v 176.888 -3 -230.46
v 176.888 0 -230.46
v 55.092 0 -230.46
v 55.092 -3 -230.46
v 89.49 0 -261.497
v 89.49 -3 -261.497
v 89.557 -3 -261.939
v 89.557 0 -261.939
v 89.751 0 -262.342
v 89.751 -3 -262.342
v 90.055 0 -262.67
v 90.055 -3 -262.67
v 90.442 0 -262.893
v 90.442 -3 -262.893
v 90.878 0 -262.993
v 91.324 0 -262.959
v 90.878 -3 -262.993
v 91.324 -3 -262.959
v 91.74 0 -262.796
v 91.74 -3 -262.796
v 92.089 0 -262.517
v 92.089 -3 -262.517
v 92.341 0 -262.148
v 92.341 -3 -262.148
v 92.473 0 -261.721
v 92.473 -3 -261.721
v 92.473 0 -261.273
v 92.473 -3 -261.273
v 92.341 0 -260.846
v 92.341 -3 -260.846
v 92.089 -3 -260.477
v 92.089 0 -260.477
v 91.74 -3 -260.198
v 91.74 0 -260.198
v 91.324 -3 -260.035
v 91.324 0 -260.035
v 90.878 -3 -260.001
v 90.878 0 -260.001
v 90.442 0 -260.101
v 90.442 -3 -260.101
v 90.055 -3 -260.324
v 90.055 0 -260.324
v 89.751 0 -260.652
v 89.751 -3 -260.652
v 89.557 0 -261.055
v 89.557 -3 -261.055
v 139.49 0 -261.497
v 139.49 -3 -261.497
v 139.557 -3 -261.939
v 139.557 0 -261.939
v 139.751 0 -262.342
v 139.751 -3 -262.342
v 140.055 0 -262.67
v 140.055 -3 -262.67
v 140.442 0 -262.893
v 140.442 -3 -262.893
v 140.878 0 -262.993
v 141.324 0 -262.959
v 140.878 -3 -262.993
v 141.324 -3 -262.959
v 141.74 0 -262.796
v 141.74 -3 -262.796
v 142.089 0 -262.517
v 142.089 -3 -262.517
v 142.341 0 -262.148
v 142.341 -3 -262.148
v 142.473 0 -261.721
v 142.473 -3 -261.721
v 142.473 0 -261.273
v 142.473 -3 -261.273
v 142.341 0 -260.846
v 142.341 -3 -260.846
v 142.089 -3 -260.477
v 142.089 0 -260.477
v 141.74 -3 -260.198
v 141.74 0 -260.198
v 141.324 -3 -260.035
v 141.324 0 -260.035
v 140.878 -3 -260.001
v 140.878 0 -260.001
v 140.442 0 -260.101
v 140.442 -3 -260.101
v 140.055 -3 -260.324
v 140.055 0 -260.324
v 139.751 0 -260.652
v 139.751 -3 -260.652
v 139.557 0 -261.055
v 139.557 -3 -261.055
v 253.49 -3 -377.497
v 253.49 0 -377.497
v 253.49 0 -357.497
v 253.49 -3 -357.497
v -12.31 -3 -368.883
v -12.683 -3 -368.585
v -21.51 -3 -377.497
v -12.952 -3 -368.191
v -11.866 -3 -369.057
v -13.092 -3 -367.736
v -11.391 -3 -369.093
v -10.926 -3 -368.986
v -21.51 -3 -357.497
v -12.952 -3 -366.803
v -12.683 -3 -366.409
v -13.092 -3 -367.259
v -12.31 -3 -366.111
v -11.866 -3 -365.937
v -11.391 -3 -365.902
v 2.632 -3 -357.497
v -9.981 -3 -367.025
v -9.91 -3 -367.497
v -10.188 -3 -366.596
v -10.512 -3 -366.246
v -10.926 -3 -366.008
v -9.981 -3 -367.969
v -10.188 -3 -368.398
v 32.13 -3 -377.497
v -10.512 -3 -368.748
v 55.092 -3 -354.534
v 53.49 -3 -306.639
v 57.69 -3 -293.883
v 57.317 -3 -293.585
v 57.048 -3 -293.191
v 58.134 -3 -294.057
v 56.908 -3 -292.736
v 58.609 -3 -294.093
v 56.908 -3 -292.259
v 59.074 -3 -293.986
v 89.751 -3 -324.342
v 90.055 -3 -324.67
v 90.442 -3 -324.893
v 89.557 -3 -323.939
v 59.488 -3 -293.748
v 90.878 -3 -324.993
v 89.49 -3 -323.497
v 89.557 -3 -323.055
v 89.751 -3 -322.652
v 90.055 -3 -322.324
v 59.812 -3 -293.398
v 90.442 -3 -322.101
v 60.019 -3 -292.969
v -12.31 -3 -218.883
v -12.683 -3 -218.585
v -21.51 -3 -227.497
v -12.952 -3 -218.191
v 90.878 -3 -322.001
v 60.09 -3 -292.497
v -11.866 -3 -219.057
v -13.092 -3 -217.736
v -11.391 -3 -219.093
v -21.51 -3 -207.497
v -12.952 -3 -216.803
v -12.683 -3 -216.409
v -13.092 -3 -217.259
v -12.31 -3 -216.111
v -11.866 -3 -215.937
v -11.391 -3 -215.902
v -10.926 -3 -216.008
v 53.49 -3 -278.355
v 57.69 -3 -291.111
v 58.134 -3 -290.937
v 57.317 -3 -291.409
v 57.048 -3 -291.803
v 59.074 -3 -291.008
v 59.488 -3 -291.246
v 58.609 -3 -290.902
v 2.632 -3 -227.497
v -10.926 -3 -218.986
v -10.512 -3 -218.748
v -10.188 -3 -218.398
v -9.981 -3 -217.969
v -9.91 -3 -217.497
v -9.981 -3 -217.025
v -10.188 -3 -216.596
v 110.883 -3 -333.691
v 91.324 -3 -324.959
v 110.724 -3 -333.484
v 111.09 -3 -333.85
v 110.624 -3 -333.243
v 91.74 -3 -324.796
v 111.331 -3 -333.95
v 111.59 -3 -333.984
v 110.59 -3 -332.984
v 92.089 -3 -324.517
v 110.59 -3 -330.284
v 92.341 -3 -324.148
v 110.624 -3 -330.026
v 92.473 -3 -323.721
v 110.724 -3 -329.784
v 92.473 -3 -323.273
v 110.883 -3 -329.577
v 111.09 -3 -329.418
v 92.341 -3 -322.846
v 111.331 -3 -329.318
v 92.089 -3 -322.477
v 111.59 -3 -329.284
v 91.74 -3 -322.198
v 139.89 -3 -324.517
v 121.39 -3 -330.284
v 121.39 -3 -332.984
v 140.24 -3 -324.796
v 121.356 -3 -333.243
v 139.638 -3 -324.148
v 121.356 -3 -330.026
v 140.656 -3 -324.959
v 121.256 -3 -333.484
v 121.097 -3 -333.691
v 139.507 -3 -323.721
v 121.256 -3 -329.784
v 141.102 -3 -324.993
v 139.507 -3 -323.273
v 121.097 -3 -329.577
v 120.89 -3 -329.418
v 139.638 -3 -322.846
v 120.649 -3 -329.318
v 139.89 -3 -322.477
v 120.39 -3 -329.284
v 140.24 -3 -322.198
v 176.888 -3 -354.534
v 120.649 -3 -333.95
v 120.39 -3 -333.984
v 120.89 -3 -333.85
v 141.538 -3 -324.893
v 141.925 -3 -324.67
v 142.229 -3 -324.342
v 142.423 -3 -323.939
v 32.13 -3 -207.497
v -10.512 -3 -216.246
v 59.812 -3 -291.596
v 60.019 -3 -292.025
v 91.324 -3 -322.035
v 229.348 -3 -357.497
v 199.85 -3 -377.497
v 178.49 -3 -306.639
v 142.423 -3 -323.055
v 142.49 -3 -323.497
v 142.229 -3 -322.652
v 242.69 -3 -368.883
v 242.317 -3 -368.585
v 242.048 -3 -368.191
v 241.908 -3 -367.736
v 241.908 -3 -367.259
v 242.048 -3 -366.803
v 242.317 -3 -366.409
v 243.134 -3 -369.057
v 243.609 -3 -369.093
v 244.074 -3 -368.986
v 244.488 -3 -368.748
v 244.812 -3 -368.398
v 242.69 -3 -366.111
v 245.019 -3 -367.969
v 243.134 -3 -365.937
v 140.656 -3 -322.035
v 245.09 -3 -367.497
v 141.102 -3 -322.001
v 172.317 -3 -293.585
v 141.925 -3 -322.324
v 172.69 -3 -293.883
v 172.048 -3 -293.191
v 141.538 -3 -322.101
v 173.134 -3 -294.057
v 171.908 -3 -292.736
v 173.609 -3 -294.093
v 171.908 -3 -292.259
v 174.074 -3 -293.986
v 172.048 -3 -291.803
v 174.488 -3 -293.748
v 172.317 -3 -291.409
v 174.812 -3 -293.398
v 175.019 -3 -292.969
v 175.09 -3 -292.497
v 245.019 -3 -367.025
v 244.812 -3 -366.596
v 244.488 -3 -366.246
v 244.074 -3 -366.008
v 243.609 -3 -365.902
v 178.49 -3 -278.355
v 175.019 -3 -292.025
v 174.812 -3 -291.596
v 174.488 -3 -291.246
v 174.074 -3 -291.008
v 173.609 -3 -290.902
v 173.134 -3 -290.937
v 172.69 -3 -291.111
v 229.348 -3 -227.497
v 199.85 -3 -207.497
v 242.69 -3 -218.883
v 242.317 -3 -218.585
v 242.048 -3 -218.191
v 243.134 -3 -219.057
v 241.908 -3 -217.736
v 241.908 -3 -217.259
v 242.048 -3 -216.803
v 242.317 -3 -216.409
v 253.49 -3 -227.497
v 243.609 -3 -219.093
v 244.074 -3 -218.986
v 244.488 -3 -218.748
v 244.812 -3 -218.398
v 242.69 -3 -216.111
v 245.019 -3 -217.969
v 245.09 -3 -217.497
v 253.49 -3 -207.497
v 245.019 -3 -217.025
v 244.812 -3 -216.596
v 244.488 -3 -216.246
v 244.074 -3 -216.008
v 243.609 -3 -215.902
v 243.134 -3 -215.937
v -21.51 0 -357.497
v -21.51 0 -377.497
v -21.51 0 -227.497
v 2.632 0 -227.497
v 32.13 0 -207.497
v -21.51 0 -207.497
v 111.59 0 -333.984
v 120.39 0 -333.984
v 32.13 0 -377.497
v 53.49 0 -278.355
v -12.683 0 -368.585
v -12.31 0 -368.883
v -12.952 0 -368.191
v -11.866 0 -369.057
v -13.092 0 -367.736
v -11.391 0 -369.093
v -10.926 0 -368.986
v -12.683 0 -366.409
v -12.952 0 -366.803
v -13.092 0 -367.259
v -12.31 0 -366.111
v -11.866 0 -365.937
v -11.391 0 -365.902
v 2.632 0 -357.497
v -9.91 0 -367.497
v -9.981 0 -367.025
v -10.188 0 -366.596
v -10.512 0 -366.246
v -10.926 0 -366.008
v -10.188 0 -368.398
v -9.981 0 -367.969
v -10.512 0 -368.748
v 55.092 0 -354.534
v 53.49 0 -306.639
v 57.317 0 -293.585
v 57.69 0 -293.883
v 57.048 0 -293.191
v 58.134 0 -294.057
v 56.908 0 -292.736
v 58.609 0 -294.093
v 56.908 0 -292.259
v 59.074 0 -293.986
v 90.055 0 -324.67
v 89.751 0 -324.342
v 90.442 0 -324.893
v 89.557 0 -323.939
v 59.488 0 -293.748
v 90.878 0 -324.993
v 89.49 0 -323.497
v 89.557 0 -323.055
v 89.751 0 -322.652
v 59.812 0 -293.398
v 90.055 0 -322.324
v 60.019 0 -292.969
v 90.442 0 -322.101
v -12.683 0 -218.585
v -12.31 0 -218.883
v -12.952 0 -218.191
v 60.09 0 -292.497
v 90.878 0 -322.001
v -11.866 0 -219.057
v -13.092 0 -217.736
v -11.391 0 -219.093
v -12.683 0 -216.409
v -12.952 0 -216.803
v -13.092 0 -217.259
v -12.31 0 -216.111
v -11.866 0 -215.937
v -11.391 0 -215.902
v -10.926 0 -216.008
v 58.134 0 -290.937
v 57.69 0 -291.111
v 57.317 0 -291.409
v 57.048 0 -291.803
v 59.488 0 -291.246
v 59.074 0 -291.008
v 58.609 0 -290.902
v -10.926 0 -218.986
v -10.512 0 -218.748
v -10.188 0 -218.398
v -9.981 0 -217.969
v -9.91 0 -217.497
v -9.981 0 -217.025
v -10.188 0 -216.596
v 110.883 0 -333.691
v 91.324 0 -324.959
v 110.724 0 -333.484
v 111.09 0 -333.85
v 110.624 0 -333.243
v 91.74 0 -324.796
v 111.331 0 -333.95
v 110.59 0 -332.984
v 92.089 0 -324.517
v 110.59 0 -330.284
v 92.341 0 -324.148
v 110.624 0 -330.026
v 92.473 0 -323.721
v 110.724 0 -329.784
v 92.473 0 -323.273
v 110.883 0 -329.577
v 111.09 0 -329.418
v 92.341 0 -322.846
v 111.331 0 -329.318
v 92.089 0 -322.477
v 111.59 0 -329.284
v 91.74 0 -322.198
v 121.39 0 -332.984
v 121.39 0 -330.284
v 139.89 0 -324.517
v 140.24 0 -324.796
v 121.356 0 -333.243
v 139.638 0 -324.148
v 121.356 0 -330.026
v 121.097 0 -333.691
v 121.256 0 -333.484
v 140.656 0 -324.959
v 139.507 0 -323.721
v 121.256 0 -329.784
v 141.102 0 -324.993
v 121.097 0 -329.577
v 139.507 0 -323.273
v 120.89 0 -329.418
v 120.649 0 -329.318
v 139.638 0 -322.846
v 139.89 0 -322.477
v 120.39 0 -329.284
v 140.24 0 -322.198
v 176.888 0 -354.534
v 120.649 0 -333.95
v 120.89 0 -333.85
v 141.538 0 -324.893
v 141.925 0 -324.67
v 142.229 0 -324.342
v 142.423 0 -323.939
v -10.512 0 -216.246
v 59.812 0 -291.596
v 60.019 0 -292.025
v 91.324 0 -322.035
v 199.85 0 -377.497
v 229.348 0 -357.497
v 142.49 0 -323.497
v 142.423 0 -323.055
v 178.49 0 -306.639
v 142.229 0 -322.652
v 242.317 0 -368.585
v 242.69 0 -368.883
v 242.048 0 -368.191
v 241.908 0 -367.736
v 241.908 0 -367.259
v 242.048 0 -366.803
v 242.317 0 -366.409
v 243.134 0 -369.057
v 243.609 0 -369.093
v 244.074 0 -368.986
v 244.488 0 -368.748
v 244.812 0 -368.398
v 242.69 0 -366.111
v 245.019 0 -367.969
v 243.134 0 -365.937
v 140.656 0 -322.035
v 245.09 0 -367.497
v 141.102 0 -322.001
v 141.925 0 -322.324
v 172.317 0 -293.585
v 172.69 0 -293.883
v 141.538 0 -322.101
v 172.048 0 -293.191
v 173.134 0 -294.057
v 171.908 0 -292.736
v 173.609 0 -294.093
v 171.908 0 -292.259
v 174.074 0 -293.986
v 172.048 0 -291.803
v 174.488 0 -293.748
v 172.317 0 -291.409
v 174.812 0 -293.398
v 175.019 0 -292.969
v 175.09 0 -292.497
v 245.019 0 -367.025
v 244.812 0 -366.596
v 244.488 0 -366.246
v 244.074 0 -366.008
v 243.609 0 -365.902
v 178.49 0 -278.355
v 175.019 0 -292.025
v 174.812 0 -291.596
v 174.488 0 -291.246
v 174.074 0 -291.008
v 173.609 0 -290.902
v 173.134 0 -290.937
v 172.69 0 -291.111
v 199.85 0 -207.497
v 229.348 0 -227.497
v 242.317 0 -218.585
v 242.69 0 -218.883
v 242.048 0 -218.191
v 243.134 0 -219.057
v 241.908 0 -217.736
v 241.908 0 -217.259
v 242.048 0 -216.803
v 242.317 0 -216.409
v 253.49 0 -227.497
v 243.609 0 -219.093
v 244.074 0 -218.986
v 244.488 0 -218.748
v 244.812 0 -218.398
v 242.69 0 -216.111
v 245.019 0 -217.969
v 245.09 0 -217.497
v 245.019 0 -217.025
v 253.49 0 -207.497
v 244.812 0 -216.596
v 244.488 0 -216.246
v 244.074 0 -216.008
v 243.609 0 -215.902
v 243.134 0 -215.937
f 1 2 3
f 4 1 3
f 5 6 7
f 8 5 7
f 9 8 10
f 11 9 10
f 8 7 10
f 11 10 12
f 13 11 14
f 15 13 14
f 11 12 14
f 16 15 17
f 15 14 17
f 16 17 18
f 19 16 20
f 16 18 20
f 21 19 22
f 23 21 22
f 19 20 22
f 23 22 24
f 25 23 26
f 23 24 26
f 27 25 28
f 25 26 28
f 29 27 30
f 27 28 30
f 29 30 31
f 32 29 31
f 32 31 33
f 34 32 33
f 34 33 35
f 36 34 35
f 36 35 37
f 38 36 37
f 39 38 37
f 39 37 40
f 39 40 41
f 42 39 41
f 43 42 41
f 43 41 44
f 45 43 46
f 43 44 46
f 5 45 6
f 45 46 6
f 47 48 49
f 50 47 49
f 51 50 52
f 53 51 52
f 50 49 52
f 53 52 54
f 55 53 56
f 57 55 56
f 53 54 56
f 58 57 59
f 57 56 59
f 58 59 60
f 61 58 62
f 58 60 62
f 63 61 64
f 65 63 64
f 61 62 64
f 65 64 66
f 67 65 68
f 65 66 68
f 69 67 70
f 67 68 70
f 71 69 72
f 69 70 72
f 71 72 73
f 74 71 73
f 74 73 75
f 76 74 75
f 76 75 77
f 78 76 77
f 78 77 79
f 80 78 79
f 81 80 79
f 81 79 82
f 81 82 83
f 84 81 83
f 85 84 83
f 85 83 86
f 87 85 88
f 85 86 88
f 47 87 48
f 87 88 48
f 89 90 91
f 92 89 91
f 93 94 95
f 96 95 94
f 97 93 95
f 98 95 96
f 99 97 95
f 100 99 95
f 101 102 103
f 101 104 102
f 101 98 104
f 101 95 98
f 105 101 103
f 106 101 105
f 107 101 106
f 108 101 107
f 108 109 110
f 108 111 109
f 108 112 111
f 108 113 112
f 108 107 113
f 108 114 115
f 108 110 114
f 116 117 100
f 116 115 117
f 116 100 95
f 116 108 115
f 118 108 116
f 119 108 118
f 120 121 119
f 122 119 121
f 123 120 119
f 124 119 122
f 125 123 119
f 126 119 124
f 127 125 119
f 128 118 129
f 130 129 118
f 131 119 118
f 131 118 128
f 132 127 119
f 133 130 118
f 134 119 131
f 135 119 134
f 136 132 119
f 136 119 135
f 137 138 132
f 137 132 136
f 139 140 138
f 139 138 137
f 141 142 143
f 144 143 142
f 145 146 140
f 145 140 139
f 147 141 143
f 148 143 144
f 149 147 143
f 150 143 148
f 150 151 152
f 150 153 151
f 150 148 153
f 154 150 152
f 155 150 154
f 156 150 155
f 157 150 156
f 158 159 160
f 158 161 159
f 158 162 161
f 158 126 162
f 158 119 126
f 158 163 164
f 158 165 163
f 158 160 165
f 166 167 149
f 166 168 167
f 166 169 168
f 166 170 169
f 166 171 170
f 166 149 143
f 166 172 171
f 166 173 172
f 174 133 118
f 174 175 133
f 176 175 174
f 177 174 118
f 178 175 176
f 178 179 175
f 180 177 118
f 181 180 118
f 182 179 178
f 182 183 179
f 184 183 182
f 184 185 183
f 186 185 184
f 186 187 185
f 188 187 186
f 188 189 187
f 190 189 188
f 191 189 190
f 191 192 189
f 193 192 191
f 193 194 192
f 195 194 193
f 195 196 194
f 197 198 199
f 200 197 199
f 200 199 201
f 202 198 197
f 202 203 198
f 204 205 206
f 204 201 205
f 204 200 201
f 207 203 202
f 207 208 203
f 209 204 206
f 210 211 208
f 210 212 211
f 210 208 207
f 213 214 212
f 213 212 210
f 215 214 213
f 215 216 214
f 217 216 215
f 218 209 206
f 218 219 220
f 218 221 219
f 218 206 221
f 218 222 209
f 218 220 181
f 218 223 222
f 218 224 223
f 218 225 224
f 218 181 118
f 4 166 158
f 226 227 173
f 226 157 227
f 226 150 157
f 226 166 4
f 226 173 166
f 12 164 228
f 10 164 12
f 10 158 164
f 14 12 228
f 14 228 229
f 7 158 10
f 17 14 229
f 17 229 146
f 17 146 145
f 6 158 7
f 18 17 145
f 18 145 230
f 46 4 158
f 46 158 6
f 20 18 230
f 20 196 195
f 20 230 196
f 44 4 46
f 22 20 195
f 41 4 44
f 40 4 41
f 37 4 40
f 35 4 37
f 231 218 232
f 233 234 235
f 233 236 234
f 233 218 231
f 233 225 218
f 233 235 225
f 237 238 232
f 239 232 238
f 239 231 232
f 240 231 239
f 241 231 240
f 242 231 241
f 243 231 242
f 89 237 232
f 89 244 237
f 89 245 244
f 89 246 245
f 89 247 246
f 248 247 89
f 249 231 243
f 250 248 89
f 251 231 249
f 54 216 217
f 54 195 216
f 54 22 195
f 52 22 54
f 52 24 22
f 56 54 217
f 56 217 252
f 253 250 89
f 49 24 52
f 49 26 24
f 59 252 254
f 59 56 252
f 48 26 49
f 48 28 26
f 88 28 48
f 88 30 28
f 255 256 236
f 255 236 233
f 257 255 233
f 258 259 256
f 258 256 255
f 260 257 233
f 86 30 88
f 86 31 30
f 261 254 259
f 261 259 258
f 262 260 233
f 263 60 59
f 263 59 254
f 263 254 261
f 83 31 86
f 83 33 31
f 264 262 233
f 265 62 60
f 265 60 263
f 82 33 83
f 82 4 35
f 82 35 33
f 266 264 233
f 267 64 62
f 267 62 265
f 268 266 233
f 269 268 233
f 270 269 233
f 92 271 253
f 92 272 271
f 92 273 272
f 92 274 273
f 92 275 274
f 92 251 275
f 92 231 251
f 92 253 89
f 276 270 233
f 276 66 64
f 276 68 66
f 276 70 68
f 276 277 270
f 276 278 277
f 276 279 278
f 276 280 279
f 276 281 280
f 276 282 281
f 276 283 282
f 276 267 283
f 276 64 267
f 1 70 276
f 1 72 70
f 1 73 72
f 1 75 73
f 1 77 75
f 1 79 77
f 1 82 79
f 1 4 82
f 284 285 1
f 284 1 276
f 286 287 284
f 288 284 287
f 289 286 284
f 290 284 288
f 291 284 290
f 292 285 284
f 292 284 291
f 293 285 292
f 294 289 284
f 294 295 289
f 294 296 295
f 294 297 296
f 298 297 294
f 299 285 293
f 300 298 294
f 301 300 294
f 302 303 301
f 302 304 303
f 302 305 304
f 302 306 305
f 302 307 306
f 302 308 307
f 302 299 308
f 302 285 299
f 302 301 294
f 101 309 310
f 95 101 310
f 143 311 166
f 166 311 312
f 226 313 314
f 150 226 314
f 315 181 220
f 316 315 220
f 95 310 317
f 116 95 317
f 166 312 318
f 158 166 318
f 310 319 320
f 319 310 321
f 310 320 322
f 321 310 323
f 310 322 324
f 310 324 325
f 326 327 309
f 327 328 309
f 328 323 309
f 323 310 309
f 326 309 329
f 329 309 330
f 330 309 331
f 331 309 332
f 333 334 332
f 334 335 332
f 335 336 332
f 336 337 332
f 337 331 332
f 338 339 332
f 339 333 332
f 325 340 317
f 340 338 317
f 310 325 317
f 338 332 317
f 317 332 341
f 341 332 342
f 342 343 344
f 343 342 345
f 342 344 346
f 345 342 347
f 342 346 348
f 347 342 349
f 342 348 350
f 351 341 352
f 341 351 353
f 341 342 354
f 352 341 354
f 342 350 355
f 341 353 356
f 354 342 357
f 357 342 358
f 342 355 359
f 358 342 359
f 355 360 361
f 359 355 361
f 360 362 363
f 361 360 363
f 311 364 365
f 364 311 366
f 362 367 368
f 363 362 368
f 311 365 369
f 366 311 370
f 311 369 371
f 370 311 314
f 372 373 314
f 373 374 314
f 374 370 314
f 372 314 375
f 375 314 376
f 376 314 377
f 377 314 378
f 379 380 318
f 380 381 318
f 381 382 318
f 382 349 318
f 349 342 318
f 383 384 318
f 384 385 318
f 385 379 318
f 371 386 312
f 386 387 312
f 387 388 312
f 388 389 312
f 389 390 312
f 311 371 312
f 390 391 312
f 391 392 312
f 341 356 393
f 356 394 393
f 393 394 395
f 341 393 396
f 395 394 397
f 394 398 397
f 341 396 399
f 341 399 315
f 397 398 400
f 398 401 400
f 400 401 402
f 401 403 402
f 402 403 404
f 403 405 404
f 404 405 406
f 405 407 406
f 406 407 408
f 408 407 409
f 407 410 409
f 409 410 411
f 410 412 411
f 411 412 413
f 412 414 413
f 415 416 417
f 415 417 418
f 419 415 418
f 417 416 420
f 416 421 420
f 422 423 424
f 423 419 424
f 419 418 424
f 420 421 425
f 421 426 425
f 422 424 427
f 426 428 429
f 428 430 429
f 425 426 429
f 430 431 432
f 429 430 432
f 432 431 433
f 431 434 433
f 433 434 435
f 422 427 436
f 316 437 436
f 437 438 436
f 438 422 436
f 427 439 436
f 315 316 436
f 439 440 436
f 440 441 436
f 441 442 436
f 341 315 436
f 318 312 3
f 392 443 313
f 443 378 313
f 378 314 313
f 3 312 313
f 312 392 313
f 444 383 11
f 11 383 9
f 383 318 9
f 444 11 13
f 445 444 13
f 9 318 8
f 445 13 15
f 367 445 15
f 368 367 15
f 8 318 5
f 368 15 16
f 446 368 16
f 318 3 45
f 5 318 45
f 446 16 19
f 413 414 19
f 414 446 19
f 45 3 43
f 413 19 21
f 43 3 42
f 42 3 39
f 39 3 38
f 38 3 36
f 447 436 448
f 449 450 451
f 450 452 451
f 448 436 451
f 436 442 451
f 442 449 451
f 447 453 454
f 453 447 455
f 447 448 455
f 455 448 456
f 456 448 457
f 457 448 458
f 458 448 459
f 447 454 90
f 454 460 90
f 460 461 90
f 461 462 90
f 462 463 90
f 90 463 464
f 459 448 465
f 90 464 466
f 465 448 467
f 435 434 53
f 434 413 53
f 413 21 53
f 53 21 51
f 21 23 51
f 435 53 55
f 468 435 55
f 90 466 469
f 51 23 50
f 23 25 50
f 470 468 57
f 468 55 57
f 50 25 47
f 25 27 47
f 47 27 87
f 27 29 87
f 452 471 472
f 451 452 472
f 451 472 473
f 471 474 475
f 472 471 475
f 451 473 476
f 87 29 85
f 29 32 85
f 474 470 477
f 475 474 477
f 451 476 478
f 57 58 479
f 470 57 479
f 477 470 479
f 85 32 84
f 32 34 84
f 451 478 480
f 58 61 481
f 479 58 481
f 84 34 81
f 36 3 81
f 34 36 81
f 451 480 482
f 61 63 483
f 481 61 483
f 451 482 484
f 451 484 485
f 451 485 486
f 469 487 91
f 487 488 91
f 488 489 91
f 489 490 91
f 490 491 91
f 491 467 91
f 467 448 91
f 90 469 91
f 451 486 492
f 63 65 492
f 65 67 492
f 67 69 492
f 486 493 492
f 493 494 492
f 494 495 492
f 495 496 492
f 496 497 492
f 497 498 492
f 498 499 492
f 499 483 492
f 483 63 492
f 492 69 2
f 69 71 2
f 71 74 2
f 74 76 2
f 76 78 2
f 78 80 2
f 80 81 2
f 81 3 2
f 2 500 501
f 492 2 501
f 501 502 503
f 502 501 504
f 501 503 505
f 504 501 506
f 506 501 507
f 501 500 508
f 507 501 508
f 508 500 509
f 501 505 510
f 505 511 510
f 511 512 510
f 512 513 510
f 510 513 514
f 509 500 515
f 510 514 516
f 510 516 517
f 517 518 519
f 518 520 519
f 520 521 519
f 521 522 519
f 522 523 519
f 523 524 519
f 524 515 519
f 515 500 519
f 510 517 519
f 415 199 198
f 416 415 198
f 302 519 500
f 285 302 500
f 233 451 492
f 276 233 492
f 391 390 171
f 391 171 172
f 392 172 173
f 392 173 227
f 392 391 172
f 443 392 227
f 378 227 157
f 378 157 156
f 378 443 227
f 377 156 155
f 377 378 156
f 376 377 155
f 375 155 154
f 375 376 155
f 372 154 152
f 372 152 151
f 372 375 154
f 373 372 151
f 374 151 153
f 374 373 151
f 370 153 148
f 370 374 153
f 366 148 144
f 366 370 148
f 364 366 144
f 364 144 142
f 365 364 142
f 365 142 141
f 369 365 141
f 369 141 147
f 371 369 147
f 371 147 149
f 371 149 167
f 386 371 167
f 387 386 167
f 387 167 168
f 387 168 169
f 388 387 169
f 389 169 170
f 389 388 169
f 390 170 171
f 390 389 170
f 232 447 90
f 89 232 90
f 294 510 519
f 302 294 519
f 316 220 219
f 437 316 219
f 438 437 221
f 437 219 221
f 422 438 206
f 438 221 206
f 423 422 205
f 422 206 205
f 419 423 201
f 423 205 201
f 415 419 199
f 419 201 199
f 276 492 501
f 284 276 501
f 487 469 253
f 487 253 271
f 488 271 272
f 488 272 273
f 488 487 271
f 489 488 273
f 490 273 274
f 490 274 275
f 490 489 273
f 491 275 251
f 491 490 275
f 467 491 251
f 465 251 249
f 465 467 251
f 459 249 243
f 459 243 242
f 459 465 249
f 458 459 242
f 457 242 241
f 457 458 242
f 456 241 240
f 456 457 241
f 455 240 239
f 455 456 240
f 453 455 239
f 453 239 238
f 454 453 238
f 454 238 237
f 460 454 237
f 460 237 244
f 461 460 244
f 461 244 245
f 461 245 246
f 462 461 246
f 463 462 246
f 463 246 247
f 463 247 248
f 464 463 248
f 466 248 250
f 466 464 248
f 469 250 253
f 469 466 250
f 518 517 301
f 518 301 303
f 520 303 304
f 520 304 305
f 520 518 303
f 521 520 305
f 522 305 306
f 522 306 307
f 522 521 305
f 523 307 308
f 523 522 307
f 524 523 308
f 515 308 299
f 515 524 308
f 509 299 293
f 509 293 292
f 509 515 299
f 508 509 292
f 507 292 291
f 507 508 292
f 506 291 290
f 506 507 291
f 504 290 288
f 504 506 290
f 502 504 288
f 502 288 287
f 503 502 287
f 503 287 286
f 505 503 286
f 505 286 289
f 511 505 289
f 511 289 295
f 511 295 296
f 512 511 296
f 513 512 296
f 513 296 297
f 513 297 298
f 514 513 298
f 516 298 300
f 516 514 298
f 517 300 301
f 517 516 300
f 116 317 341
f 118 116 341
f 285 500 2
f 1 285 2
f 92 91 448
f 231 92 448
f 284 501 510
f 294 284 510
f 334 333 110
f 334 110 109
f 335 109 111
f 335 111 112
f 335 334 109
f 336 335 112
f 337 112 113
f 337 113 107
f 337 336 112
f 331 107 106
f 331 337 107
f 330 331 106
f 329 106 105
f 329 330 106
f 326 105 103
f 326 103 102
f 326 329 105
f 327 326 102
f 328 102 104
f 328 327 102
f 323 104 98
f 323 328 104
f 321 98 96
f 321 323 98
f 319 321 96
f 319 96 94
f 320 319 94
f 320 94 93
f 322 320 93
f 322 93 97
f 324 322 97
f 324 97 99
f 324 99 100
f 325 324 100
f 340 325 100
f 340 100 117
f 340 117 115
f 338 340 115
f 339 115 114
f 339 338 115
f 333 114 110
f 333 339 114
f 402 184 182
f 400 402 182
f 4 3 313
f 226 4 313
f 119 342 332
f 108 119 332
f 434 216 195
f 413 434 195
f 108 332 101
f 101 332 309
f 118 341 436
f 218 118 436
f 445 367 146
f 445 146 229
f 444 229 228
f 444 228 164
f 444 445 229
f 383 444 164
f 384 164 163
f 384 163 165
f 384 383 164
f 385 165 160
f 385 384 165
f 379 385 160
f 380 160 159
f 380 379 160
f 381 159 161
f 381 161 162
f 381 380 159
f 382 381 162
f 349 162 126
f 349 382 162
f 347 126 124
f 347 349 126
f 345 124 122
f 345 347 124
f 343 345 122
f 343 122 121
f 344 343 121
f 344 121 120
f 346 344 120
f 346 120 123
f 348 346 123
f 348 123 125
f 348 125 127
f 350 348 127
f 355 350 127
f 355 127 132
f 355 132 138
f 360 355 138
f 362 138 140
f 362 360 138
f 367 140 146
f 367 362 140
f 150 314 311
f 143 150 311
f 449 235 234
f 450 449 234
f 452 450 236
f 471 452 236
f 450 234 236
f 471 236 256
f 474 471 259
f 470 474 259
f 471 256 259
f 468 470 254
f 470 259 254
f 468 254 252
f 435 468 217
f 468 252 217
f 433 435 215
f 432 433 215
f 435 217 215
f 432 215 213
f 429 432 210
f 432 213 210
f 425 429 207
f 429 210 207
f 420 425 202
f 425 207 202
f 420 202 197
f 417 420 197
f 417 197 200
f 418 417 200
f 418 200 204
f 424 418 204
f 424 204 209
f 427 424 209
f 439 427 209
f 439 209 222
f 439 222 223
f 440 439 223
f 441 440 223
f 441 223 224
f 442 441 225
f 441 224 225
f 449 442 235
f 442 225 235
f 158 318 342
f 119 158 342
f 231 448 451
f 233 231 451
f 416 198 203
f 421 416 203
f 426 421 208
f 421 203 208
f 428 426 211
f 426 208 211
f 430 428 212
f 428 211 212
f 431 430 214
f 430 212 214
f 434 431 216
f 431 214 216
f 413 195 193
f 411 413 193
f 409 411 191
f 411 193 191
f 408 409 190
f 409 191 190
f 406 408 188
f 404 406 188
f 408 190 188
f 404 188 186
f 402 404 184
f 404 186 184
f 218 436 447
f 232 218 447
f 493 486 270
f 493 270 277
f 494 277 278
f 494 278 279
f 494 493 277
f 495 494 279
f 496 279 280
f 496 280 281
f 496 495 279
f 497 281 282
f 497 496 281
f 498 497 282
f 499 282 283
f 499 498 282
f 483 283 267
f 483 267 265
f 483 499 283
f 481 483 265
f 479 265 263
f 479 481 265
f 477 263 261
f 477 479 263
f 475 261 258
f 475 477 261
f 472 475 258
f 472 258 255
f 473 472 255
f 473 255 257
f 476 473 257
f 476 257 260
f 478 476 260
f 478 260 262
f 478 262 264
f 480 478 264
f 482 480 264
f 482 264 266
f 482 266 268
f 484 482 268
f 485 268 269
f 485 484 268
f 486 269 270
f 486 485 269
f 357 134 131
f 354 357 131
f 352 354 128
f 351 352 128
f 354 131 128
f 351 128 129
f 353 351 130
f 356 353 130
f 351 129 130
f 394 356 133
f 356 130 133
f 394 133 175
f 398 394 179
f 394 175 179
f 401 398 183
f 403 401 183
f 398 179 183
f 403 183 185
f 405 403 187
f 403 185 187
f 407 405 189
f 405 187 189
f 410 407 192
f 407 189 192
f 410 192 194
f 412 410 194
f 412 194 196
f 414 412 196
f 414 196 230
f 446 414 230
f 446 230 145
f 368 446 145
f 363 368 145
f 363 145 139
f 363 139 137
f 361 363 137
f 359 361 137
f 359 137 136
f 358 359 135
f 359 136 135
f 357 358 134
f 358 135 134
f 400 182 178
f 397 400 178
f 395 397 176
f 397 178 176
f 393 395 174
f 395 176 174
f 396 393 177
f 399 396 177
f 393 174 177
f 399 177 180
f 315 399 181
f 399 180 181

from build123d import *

# Parameters (mm, degrees)
SKETCH1_R          = 1.6
EXTRUDE2_DEPTH     = 3
CUT_EXTRUDE4_DEPTH = 3


with BuildPart() as part:
    # Sketch1 → Extrude2 (new body)
    with BuildSketch(Plane.XZ):
        Polygon((-21.510078765, -227.497048214), (2.632056859, -227.497048214), (53.489921235, -278.35491259), (53.489921235, -306.639183837), (2.632056859, -357.497048214), (-21.510078765, -357.497048214), (-21.510078765, -377.497048214), (32.129531542, -377.497048214), (55.092111961, -354.534467794), (176.887730509, -354.534467794), (199.850310928, -377.497048214), (253.489921235, -377.497048214), (253.489921235, -357.497048214), (229.347785611, -357.497048214), (178.489921235, -306.639183837), (178.489921235, -278.35491259), (229.347785611, -227.497048214), (253.489921235, -227.497048214), (253.489921235, -207.497048214), (199.850310928, -207.497048214), (176.887730509, -230.459628633), (55.092111961, -230.459628633), (32.129531542, -207.497048214), (-21.510078765, -207.497048214), align=None)
        with Locations((-11.510078765, -367.497048214)):
            Circle(SKETCH1_R, mode=Mode.SUBTRACT)
        with Locations((58.489921235, -292.497048214)):
            Circle(SKETCH1_R, mode=Mode.SUBTRACT)
        with Locations((243.489921235, -367.497048214)):
            Circle(SKETCH1_R, mode=Mode.SUBTRACT)
        with Locations((173.489921235, -292.497048214)):
            Circle(SKETCH1_R, mode=Mode.SUBTRACT)
        with Locations((-11.510078765, -217.497048214)):
            Circle(SKETCH1_R, mode=Mode.SUBTRACT)
        with Locations((243.489921235, -217.497048214)):
            Circle(SKETCH1_R, mode=Mode.SUBTRACT)
    extrude(amount=EXTRUDE2_DEPTH)

    # Sketch4 → Cut-Extrude4 (cut)
    with BuildSketch(Plane.XZ.offset(3)):
        with BuildLine():
            Line((121.389921235, -332.984350137), (121.389921235, -330.284350137))
            ThreePointArc((121.389921235, -330.284350137), (121.097028016, -329.577243356), (120.389921235, -329.284350137))
            Line((120.389921235, -329.284350137), (111.589921235, -329.284350137))
            ThreePointArc((111.589921235, -329.284350137), (110.882814454, -329.577243356), (110.589921235, -330.284350137))
            Line((110.589921235, -330.284350137), (110.589921235, -332.984350137))
            ThreePointArc((110.589921235, -332.984350137), (110.882814454, -333.691456918), (111.589921235, -333.984350137))
            Line((111.589921235, -333.984350137), (120.389921235, -333.984350137))
            ThreePointArc((120.389921235, -333.984350137), (121.097028016, -333.691456918), (121.389921235, -332.984350137))
        make_face()
        with BuildLine():
            ThreePointArc((142.489921235, -261.497048214), (140.989921235, -259.997048214), (139.489921235, -261.497048214))
            ThreePointArc((139.489921235, -261.497048214), (140.989921235, -262.997048214), (142.489921235, -261.497048214))
        make_face()
        with BuildLine():
            ThreePointArc((139.489921235, -323.497048214), (140.989921235, -324.997048214), (142.489921235, -323.497048214))
            ThreePointArc((142.489921235, -323.497048214), (140.989921235, -321.997048214), (139.489921235, -323.497048214))
        make_face()
        with BuildLine():
            ThreePointArc((92.489921235, -261.497048214), (90.989921235, -259.997048214), (89.489921235, -261.497048214))
            ThreePointArc((89.489921235, -261.497048214), (90.989921235, -262.997048214), (92.489921235, -261.497048214))
        make_face()
        with BuildLine():
            ThreePointArc((92.489921235, -323.497048214), (90.989921235, -321.997048214), (89.489921235, -323.497048214))
            ThreePointArc((89.489921235, -323.497048214), (90.989921235, -324.997048214), (92.489921235, -323.497048214))
        make_face()
    extrude(amount=-CUT_EXTRUDE4_DEPTH, mode=Mode.SUBTRACT)


solid = part.part
